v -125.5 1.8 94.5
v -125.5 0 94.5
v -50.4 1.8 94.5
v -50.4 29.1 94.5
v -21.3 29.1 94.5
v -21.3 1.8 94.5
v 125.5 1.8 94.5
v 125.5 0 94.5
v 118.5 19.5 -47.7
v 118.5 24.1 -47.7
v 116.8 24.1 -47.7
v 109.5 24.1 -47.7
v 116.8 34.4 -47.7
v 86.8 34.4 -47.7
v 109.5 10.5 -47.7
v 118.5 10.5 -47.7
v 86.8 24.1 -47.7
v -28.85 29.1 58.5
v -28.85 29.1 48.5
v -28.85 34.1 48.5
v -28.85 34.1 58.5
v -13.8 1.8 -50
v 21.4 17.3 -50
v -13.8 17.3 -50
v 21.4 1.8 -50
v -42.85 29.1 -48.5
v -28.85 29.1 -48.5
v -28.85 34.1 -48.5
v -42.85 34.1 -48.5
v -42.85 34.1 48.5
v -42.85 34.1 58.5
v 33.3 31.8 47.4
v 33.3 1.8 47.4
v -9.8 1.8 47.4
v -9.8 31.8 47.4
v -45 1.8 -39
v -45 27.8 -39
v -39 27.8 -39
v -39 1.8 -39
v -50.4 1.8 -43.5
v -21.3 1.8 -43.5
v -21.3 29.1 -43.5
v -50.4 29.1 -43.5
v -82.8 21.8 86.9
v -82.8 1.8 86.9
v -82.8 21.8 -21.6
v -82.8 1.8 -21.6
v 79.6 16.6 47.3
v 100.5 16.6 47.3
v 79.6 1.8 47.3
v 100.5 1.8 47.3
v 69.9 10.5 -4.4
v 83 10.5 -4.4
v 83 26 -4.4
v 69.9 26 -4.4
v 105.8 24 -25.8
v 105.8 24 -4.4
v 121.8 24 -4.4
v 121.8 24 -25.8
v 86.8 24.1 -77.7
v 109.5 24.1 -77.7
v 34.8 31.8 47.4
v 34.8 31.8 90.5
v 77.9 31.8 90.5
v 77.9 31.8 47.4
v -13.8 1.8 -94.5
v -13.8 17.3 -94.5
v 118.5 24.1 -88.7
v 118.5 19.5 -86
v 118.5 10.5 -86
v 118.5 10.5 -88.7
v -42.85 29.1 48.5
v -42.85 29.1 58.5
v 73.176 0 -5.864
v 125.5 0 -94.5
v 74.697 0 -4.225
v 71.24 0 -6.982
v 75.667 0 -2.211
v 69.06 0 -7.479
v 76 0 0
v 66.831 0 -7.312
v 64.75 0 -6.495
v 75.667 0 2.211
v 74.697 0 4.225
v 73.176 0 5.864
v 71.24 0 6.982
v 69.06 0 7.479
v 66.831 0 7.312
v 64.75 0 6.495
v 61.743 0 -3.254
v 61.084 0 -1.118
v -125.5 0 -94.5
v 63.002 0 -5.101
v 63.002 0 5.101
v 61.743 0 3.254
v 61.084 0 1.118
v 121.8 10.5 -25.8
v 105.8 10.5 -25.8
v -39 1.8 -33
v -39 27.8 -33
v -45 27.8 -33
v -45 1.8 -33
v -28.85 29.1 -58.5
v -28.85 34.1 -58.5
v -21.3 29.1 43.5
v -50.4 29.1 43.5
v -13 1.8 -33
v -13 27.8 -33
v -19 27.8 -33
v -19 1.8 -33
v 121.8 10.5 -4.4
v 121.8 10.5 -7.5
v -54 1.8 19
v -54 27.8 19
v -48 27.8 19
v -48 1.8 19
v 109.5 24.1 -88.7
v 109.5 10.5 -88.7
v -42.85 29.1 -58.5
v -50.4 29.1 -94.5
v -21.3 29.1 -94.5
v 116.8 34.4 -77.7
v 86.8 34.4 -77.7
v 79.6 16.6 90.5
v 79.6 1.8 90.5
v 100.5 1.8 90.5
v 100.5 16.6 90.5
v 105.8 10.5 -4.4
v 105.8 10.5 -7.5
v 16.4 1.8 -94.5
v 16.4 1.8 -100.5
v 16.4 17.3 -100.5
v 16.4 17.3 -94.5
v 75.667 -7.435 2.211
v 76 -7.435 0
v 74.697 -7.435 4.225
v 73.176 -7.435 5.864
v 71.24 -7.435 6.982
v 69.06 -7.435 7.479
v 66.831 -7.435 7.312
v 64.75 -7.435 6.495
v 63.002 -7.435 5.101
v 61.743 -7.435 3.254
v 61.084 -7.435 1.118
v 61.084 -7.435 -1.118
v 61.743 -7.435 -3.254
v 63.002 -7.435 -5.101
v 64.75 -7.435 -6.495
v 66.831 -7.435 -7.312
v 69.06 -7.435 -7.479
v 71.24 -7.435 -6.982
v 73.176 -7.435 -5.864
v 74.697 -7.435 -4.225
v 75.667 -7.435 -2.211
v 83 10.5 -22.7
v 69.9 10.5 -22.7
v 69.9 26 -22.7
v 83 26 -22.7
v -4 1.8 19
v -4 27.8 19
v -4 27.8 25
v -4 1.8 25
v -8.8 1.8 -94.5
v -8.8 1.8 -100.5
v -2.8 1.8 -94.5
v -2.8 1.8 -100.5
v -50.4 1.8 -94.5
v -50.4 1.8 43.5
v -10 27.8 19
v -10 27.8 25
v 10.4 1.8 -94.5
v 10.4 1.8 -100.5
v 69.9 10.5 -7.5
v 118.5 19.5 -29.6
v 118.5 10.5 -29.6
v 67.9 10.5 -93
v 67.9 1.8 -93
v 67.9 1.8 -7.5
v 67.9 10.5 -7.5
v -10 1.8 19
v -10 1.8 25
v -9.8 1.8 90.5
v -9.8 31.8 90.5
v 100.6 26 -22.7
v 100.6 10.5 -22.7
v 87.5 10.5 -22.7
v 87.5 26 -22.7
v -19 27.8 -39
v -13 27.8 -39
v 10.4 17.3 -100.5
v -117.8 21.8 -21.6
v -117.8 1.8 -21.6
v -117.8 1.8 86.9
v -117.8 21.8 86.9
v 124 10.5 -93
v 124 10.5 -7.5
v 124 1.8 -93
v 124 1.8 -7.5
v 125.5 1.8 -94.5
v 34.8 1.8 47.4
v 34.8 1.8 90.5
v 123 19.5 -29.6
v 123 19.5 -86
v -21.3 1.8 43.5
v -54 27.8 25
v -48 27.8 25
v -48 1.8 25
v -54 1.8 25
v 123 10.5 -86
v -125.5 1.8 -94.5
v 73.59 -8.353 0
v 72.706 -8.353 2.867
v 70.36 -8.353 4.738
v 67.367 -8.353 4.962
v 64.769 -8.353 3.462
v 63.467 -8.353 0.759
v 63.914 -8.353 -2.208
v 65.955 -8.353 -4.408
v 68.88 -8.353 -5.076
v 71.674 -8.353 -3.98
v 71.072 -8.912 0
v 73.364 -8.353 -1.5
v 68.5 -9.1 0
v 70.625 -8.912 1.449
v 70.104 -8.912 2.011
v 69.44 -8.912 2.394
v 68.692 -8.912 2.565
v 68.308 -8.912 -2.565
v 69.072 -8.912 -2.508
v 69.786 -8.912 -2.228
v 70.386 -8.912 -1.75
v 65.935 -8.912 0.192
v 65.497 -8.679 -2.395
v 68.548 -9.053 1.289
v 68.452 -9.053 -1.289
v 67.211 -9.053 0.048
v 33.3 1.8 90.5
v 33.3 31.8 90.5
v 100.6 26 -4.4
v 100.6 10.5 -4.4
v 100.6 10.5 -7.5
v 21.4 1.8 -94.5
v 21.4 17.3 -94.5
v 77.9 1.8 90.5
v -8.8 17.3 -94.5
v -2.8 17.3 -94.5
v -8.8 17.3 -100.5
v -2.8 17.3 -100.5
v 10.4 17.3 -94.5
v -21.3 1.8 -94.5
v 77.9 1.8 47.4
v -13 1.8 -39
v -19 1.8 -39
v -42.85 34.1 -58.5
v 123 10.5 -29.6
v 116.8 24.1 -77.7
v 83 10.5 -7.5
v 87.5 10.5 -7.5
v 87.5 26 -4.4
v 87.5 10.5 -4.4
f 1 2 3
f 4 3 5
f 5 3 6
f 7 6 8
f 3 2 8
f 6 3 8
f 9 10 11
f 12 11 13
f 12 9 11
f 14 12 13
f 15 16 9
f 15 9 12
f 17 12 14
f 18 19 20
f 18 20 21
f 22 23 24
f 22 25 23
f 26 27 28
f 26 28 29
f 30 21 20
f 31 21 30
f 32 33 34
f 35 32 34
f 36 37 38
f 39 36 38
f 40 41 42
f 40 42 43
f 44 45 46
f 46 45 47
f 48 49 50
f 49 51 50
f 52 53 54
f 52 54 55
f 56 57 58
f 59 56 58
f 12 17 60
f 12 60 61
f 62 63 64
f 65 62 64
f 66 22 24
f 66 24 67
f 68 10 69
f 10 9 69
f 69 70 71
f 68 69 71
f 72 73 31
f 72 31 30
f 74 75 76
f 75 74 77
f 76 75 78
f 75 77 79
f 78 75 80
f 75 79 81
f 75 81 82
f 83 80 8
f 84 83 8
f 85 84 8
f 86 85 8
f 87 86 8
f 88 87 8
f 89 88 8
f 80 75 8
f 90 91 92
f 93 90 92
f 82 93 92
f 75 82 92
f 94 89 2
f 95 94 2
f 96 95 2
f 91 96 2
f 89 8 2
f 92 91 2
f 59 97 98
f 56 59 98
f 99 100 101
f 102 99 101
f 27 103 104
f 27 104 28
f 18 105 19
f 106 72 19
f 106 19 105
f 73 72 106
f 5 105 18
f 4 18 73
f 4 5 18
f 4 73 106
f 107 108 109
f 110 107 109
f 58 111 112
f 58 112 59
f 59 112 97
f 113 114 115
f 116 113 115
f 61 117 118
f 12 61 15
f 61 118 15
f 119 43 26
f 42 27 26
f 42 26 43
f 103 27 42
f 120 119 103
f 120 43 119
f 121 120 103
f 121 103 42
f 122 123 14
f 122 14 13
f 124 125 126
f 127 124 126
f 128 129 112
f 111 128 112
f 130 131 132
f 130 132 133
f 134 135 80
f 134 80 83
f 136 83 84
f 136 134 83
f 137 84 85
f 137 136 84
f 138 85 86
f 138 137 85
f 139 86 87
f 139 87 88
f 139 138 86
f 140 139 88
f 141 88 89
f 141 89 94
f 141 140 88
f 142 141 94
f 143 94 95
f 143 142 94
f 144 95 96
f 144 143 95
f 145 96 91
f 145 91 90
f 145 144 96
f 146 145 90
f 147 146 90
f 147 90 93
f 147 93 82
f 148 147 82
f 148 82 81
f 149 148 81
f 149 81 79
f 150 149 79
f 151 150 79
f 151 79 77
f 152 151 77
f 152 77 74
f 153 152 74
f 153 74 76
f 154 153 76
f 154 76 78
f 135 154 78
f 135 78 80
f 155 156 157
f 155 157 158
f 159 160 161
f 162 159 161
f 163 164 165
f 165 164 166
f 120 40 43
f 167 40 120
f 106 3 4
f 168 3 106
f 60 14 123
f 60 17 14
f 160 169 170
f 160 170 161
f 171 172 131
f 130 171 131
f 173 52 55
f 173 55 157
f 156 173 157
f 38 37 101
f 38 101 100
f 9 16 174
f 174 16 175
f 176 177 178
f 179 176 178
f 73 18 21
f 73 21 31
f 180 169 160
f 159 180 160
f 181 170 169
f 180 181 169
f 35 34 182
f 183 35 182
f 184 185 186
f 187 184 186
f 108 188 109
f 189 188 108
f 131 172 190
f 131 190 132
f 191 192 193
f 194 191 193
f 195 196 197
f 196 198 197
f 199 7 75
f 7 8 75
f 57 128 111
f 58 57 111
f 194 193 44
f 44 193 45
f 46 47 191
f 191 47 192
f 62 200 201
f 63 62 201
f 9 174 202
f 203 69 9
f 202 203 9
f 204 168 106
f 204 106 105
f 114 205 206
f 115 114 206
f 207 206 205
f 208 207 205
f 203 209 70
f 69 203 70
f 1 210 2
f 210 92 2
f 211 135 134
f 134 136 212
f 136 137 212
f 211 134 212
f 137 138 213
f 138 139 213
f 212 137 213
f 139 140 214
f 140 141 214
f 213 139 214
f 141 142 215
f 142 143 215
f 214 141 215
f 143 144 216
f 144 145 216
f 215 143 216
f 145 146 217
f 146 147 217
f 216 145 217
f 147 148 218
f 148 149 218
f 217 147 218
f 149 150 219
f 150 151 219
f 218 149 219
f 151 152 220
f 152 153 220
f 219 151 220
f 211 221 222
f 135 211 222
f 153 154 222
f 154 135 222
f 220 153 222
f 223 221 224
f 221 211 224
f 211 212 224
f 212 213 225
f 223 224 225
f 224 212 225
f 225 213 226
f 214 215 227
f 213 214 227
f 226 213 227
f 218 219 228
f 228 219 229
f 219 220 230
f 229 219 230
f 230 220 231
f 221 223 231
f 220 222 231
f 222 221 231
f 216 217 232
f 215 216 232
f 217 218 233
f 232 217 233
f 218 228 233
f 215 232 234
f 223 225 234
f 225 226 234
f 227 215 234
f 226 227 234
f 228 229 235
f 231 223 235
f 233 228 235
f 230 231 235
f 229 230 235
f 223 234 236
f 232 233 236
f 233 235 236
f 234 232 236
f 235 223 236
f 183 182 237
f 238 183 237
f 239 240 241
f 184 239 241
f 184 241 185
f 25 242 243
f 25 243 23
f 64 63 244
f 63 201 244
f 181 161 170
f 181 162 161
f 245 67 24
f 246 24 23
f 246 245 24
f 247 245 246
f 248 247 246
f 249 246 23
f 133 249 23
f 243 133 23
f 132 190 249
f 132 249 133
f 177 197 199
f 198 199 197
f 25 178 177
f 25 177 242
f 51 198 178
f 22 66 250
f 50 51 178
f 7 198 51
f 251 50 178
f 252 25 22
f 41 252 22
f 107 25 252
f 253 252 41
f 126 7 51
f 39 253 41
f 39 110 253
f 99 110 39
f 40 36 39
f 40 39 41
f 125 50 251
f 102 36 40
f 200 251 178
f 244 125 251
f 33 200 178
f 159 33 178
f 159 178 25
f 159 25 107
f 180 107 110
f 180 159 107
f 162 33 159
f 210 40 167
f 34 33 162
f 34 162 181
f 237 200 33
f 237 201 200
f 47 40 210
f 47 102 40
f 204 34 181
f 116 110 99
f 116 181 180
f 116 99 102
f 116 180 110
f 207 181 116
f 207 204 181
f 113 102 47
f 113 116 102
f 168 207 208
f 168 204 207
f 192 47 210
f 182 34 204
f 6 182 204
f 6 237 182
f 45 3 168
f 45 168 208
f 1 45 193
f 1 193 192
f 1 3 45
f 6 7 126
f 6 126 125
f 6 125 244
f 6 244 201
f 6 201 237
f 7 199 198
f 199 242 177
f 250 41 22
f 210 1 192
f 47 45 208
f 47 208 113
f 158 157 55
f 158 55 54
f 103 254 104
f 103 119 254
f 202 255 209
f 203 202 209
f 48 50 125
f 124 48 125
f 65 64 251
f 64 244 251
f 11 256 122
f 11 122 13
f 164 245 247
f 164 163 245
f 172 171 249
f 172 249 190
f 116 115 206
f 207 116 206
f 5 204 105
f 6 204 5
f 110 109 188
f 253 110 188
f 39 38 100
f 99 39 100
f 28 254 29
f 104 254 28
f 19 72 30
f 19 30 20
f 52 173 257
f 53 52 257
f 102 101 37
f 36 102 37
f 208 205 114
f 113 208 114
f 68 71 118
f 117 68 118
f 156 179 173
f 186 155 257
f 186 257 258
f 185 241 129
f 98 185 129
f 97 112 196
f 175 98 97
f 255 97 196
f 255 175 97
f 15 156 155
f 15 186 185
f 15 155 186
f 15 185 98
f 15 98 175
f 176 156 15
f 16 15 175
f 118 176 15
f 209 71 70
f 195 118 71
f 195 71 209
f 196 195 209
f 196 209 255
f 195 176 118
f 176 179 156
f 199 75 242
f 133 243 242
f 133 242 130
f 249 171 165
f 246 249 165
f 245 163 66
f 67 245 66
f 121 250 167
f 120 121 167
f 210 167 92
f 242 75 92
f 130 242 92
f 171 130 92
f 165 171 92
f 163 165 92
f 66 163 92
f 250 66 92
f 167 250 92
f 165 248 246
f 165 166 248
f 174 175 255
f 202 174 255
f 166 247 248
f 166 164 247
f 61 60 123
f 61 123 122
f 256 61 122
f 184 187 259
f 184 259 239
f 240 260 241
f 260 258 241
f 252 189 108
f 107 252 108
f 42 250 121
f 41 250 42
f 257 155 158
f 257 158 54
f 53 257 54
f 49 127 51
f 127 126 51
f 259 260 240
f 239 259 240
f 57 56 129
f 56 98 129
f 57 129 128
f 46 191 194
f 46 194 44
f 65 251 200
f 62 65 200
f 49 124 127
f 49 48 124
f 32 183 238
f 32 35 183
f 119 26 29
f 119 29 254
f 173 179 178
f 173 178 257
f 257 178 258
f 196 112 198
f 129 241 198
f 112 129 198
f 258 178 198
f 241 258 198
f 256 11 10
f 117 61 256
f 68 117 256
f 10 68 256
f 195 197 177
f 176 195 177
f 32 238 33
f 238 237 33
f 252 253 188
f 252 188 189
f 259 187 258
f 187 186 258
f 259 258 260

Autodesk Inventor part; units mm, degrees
ref_plane "YZ Plane" through (0, 0, 0) normal (1, 0, 0) x (0, 1, 0)
ref_plane "XZ Plane" through (0, 0, 0) normal (0, 1, 0) x (-1, 0, 0)
ref_plane "XY Plane" through (0, 0, 0) normal (0, 0, 1) x (1, 0, 0)
sketch "Esquisse1" plane through (0, 0, 0) normal (0, 1, 0) x (-1, 0, 0)
  line L0 (125.5, 94.5) -> (-125.5, 94.5)
  line L1 (-125.5, 94.5) -> (-125.5, -94.5)
  line L2 (-125.5, -94.5) -> (125.5, -94.5)
  line L3 (125.5, -94.5) -> (125.5, 94.5)
  line L4 (125.5, 94.5) -> (-125.5, -94.5) construction
  line L5 (-125.5, 94.5) -> (125.5, -94.5) construction
  point P0 (0, 0)
  dimension "d0" = 251
  dimension "d1" = 189
extrude "Extrusion1" add sketch "Esquisse1" along normal blind 1.8
sketch "Esquisse2" plane through (0, 1.8, 0) normal (0, 1, 0) x (1, 0, 0)
  line L0 (124, 93) -> (67.9, 93)
  line L1 (67.9, 93) -> (67.9, 7.5)
  line L2 (67.9, 7.5) -> (124, 7.5)
  line L3 (124, 7.5) -> (124, 93)
  line L4 (125.5, 94.5) -> (-125.5, 94.5) projected
  line L5 (125.5, -94.5) -> (125.5, 94.5) projected
  point P0 (0, 0)
  dimension "d4" = 1.5
  dimension "d5" = 1.5
  dimension "d6" = 56.1
  dimension "d7" = 85.5
extrude "Extrusion2" add sketch "Esquisse2" along normal blind 8.7
sketch "Esquisse3" plane through (0, 10.5, 0) normal (0, 1, 0) x (1, 0, 0)
  line L0 (121.8, 25.8) -> (105.8, 25.8)
  line L1 (105.8, 25.8) -> (105.8, 4.4)
  line L2 (105.8, 4.4) -> (121.8, 4.4)
  line L3 (121.8, 4.4) -> (121.8, 25.8)
  line L4 (124, 7.5) -> (124, 93) projected
  line L5 (67.9, 7.5) -> (124, 7.5) projected
  point P0 (0, 0)
  dimension "d10" = 21.4
  dimension "d11" = 16
  dimension "d12" = 2.2
  dimension "d13" = 3.1
extrude "Extrusion3" add sketch "Esquisse3" along normal blind 13.5
sketch "Esquisse4" plane through (0, 10.5, 0) normal (0, 1, 0) x (1, 0, 0)
  line L0 (69.9, 22.7) -> (83, 22.7)
  line L1 (83, 22.7) -> (83, 4.4)
  line L2 (83, 4.4) -> (69.9, 4.4)
  line L3 (69.9, 4.4) -> (69.9, 22.7)
  line L4 (67.9, 93) -> (67.9, 7.5) projected
  line L5 (105.8, 4.4) -> (121.8, 4.4) projected
  line L6 (87.5, 4.4) -> (100.6, 4.4)
  line L7 (100.6, 4.4) -> (100.6, 22.7)
  line L8 (100.6, 22.7) -> (87.5, 22.7)
  line L9 (87.5, 22.7) -> (87.5, 4.4)
  point P0 (0, 0)
  point P1 (76.45, 4.4)
  point P2 (76.45, 22.7)
  dimension "d16" = 13.1
  dimension "d17" = 18.3
  dimension "d18" = 2
  dimension "d19" = 4.5
  dimension "d20" = 13.1
extrude "Extrusion4" add sketch "Esquisse4" along normal blind 15.5
sketch "Esquisse5" plane through (0, 10.5, 0) normal (0, 1, 0) x (1, 0, 0)
  line L0 (123, 86) -> (118.5, 86)
  line L1 (118.5, 86) -> (118.5, 29.6)
  line L2 (118.5, 29.6) -> (123, 29.6)
  line L3 (123, 29.6) -> (123, 86)
  line L4 (124, 7.5) -> (124, 93) projected
  line L5 (124, 93) -> (67.9, 93) projected
  point P0 (0, 0)
  dimension "d23" = 56.4
  dimension "d24" = 4.5
  dimension "d25" = 1
  dimension "d26" = 7
extrude "Extrusion5" add sketch "Esquisse5" along normal blind 9
sketch "Esquisse6" plane through (0, 10.5, 0) normal (0, 1, 0) x (1, 0, 0)
  line L0 (118.5, 29.6) -> (118.5, 86) projected
  line L1 (118.5, 86) -> (118.5, 88.7)
  line L2 (118.5, 88.7) -> (109.5, 88.7)
  line L3 (109.5, 88.7) -> (109.5, 47.7)
  line L4 (109.5, 47.7) -> (118.5, 47.7)
  line L5 (124, 93) -> (67.9, 93) projected
  point P0 (0, 0)
  dimension "d29" = 9
  dimension "d30" = 41
  dimension "d31" = 4.3
extrude "Extrusion6" add sketch "Esquisse6" along normal blind 13.6
sketch "Esquisse7" plane through (0, 24.1, 0) normal (0, 1, 0) x (1, 0, 0)
  line L0 (118.5, 47.7) -> (109.5, 47.7) projected
  line L1 (116.8, 47.7) -> (86.8, 47.7)
  line L2 (86.8, 47.7) -> (86.8, 77.7)
  line L3 (86.8, 77.7) -> (116.8, 77.7)
  line L4 (116.8, 77.7) -> (116.8, 47.7)
  line L5 (118.5, 47.7) -> (118.5, 88.7) projected
  point P0 (0, 0)
  dimension "d34" = 30
  dimension "d35" = 30
  dimension "d36" = 1.7
extrude "Extrusion7" add sketch "Esquisse7" along normal blind 10.3
sketch "Esquisse8" plane through (0, 1.8, 0) normal (0, 1, 0) x (1, 0, 0)
  line L0 (125.5, 94.5) -> (-125.5, 94.5) projected
  line L1 (-50.4, 94.5) -> (-21.3, 94.5)
  line L2 (-21.3, 94.5) -> (-21.3, 43.5)
  line L3 (-21.3, 43.5) -> (-50.4, 43.5)
  line L4 (-50.4, 43.5) -> (-50.4, 94.5)
  line L5 (-125.5, 94.5) -> (-125.5, -94.5) projected
  point P0 (0, 0)
  dimension "d39" = 75.1
  dimension "d40" = 29.1
  dimension "d41" = 51
extrude "Extrusion8" add sketch "Esquisse8" along normal blind 27.3
sketch "Esquisse9" plane through (0, 29.1, 0) normal (0, 1, 0) x (1, 0, 0)
  line L0 (-28.85, 48.5) -> (-42.85, 48.5)
  line L1 (-42.85, 48.5) -> (-42.85, 58.5)
  line L2 (-42.85, 58.5) -> (-28.85, 58.5)
  line L3 (-28.85, 58.5) -> (-28.85, 48.5)
  line L4 (-21.3, 43.5) -> (-21.3, 94.5) projected
  line L5 (-50.4, 94.5) -> (-50.4, 43.5) projected
  line L6 (-21.3, 94.5) -> (-50.4, 94.5) projected
  point P0 (0, 0)
  dimension "d44" = 10
  dimension "d45" = 14
  dimension "d46" = 7.55
  dimension "d47" = 7.55
  dimension "d48" = 36
extrude "Extrusion9" add sketch "Esquisse9" along normal blind 5
mirror "Symétrie1" about plane through (0, 0, 0) normal (0, 0, 1) of "Extrusion8", "Extrusion9"
sketch "Esquisse10" plane through (0, 1.8, 0) normal (0, 1, 0) x (1, 0, 0)
  line L0 (125.5, 94.5) -> (-21.3, 94.5) projected
  line L1 (-13.8, 94.5) -> (21.4, 94.5)
  line L2 (21.4, 94.5) -> (21.4, 50)
  line L3 (21.4, 50) -> (-13.8, 50)
  line L4 (-13.8, 50) -> (-13.8, 94.5)
  line L5 (16.4, 94.5) -> (10.4, 94.5)
  line L6 (10.4, 94.5) -> (10.4, 100.5)
  line L7 (10.4, 100.5) -> (16.4, 100.5)
  line L8 (16.4, 100.5) -> (16.4, 94.5)
  line L9 (-2.8, 94.5) -> (-8.8, 94.5)
  line L10 (-8.8, 94.5) -> (-8.8, 100.5)
  line L11 (-8.8, 100.5) -> (-2.8, 100.5)
  line L12 (-2.8, 100.5) -> (-2.8, 94.5)
  line L13 (-21.3, 43.5) -> (-21.3, 94.5) projected
  point P0 (0, 0)
  point P1 (21.4, 94.5)
  point P2 (-2.8, 94.5)
  point P3 (-8.8, 94.5)
  dimension "d51" = 44.5
  dimension "d52" = 35.2
  dimension "d53" = 6
  dimension "d54" = 6
  dimension "d55" = 6
  dimension "d56" = 5
  dimension "d57" = 5
  dimension "d115" = 7.5
extrude "Extrusion10" add sketch "Esquisse10" along normal blind 15.5
sketch "Esquisse11" plane through (0, 1.8, 0) normal (0, 1, 0) x (1, 0, 0)
  line L0 (-9.8, -90.5) -> (33.3, -90.5)
  line L1 (33.3, -90.5) -> (33.3, -47.4)
  line L2 (33.3, -47.4) -> (-9.8, -47.4)
  line L3 (-9.8, -47.4) -> (-9.8, -90.5)
  line L4 (34.8, -90.5) -> (77.9, -90.5)
  line L5 (77.9, -90.5) -> (77.9, -47.4)
  line L6 (77.9, -47.4) -> (34.8, -47.4)
  line L7 (34.8, -47.4) -> (34.8, -90.5)
  line L8 (-21.3, -94.5) -> (125.5, -94.5) projected
  line L9 (-21.3, -43.5) -> (-21.3, -94.5) projected
  point P0 (0, 0)
  dimension "d60" = 43.1
  dimension "d61" = 43.1
  dimension "d62" = 43.1
  dimension "d63" = 4
  dimension "d64" = 1.5
  dimension "d65" = 11.5
extrude "Extrusion11" add sketch "Esquisse11" along normal blind 30
sketch "Esquisse12" plane through (0, 1.8, 0) normal (0, 1, 0) x (1, 0, 0)
  line L0 (-117.8, -86.9) -> (-82.8, -86.9)
  line L1 (-82.8, -86.9) -> (-82.8, 21.6)
  line L2 (-82.8, 21.6) -> (-117.8, 21.6)
  line L3 (-117.8, 21.6) -> (-117.8, -86.9)
  line L4 (-125.5, -94.5) -> (-50.4, -94.5) projected
  line L5 (-125.5, 94.5) -> (-125.5, -94.5) projected
  point P0 (0, 0)
  dimension "d68" = 108.5
  dimension "d69" = 35
  dimension "d70" = 7.6
  dimension "d71" = 7.7
extrude "Extrusion12" add sketch "Esquisse12" along normal blind 20
sketch "Esquisse13" plane through (0, 1.8, 0) normal (0, 1, 0) x (1, 0, 0)
  line L0 (-21.3, -43.5) -> (-21.3, -94.5) projected
  line L1 (-4, -25) -> (-10, -25)
  line L2 (-10, -25) -> (-10, -19)
  line L3 (-10, -19) -> (-4, -19)
  line L4 (-4, -19) -> (-4, -25)
  line L5 (-4, -25) -> (-10, -19) construction
  line L6 (-10, -25) -> (-4, -19) construction
  line L7 (-48, -25) -> (-54, -25)
  line L8 (-54, -25) -> (-54, -19)
  line L9 (-54, -19) -> (-48, -19)
  line L10 (-48, -19) -> (-48, -25)
  line L11 (-48, -25) -> (-54, -19) construction
  line L12 (-54, -25) -> (-48, -19) construction
  line L13 (-7, -22) -> (-51, -22)
  line L14 (-125.5, -94.5) -> (-50.4, -94.5) projected
  line L15 (-125.5, 94.5) -> (-125.5, -94.5) projected
  line L16 (-39, 33) -> (-45, 33)
  line L17 (-45, 33) -> (-45, 39)
  line L18 (-45, 39) -> (-39, 39)
  line L19 (-39, 39) -> (-39, 33)
  line L20 (-39, 33) -> (-45, 39) construction
  line L21 (-45, 33) -> (-39, 39) construction
  line L22 (-42, 36) -> (-16, 36)
  line L23 (-13, 33) -> (-19, 33)
  line L24 (-19, 33) -> (-19, 39)
  line L25 (-19, 39) -> (-13, 39)
  line L26 (-13, 39) -> (-13, 33)
  line L27 (-13, 33) -> (-19, 39) construction
  line L28 (-19, 33) -> (-13, 39) construction
  point P0 (0, 0)
  dimension "d87" = 6
  dimension "d88" = 6
  dimension "d89" = 6
  dimension "d90" = 6
  dimension "d91" = 72.5
  dimension "d92" = 74.5
  dimension "d93" = 44
  dimension "d94" = 6
  dimension "d95" = 6
  dimension "d96" = 6
  dimension "d97" = 6
  dimension "d98" = 58
  dimension "d99" = 9
  dimension "d101" = 26
  dimension "d102" = 9
extrude "Extrusion13" add sketch "Esquisse13" along normal blind 26
sketch "Esquisse14" plane through (0, 0, 0) normal (0, 0, 1) x (1, 0, 0)
  line L0 (125.5, 0) -> (-125.5, 0) projected
  line L1 (76, 0) -> (76, -7.4346)
  line L2 (68.5, 0) -> (68.5, -9.1)
  arc A0 (68.5, -9.1) -> (76, -7.4346) centre (68.5, 8.6202) ccw
  line L3 (125.5, 0) -> (125.5, 1.8) projected
  point P0 (0, 0)
  dimension "d105" = 9.1
  dimension "d106" = 7.5
  dimension "d107" = 49.5
revolve "Révolution1" add sketch "Esquisse14" angle 360 about axis through (68.5, 0, 0) along (0, -1, 0)
sketch "Esquisse15" plane through (0, 1.8, 0) normal (0, 1, 0) x (1, 0, 0)
  line L0 (79.6, -90.5) -> (100.5, -90.5)
  line L1 (100.5, -90.5) -> (100.5, -47.3)
  line L2 (100.5, -47.3) -> (79.6, -47.3)
  line L3 (79.6, -47.3) -> (79.6, -90.5)
  line L4 (-21.3, -94.5) -> (125.5, -94.5) projected
  line L5 (34.8, -90.5) -> (77.9, -90.5) projected
  line L6 (77.9, -90.5) -> (77.9, -47.4) projected
  point P0 (0, 0)
  dimension "d109" = 20.9
  dimension "d110" = 43.2
  dimension "d112" = 1.7
extrude "Extrusion14" add sketch "Esquisse15" along normal blind 14.8
equation "\"d5\" = d4"
equation "\"d20\" = d16"
equation "\"d35\" = d34"
equation "\"d46\" = d47"
equation "\"d54\" = d53"
equation "\"d55\" = d53"
equation "\"d57\" = d56"
equation "\"d61\" = d60"
equation "\"d62\" = d60"
equation "\"d88\" = d87"
equation "\"d89\" = d88"
equation "\"d90\" = d87"
equation "\"d94\" = d88"
equation "\"d95\" = d94"
equation "\"d96\" = d95"
equation "\"d97\" = d94"
equation "\"d99\" = d102"
